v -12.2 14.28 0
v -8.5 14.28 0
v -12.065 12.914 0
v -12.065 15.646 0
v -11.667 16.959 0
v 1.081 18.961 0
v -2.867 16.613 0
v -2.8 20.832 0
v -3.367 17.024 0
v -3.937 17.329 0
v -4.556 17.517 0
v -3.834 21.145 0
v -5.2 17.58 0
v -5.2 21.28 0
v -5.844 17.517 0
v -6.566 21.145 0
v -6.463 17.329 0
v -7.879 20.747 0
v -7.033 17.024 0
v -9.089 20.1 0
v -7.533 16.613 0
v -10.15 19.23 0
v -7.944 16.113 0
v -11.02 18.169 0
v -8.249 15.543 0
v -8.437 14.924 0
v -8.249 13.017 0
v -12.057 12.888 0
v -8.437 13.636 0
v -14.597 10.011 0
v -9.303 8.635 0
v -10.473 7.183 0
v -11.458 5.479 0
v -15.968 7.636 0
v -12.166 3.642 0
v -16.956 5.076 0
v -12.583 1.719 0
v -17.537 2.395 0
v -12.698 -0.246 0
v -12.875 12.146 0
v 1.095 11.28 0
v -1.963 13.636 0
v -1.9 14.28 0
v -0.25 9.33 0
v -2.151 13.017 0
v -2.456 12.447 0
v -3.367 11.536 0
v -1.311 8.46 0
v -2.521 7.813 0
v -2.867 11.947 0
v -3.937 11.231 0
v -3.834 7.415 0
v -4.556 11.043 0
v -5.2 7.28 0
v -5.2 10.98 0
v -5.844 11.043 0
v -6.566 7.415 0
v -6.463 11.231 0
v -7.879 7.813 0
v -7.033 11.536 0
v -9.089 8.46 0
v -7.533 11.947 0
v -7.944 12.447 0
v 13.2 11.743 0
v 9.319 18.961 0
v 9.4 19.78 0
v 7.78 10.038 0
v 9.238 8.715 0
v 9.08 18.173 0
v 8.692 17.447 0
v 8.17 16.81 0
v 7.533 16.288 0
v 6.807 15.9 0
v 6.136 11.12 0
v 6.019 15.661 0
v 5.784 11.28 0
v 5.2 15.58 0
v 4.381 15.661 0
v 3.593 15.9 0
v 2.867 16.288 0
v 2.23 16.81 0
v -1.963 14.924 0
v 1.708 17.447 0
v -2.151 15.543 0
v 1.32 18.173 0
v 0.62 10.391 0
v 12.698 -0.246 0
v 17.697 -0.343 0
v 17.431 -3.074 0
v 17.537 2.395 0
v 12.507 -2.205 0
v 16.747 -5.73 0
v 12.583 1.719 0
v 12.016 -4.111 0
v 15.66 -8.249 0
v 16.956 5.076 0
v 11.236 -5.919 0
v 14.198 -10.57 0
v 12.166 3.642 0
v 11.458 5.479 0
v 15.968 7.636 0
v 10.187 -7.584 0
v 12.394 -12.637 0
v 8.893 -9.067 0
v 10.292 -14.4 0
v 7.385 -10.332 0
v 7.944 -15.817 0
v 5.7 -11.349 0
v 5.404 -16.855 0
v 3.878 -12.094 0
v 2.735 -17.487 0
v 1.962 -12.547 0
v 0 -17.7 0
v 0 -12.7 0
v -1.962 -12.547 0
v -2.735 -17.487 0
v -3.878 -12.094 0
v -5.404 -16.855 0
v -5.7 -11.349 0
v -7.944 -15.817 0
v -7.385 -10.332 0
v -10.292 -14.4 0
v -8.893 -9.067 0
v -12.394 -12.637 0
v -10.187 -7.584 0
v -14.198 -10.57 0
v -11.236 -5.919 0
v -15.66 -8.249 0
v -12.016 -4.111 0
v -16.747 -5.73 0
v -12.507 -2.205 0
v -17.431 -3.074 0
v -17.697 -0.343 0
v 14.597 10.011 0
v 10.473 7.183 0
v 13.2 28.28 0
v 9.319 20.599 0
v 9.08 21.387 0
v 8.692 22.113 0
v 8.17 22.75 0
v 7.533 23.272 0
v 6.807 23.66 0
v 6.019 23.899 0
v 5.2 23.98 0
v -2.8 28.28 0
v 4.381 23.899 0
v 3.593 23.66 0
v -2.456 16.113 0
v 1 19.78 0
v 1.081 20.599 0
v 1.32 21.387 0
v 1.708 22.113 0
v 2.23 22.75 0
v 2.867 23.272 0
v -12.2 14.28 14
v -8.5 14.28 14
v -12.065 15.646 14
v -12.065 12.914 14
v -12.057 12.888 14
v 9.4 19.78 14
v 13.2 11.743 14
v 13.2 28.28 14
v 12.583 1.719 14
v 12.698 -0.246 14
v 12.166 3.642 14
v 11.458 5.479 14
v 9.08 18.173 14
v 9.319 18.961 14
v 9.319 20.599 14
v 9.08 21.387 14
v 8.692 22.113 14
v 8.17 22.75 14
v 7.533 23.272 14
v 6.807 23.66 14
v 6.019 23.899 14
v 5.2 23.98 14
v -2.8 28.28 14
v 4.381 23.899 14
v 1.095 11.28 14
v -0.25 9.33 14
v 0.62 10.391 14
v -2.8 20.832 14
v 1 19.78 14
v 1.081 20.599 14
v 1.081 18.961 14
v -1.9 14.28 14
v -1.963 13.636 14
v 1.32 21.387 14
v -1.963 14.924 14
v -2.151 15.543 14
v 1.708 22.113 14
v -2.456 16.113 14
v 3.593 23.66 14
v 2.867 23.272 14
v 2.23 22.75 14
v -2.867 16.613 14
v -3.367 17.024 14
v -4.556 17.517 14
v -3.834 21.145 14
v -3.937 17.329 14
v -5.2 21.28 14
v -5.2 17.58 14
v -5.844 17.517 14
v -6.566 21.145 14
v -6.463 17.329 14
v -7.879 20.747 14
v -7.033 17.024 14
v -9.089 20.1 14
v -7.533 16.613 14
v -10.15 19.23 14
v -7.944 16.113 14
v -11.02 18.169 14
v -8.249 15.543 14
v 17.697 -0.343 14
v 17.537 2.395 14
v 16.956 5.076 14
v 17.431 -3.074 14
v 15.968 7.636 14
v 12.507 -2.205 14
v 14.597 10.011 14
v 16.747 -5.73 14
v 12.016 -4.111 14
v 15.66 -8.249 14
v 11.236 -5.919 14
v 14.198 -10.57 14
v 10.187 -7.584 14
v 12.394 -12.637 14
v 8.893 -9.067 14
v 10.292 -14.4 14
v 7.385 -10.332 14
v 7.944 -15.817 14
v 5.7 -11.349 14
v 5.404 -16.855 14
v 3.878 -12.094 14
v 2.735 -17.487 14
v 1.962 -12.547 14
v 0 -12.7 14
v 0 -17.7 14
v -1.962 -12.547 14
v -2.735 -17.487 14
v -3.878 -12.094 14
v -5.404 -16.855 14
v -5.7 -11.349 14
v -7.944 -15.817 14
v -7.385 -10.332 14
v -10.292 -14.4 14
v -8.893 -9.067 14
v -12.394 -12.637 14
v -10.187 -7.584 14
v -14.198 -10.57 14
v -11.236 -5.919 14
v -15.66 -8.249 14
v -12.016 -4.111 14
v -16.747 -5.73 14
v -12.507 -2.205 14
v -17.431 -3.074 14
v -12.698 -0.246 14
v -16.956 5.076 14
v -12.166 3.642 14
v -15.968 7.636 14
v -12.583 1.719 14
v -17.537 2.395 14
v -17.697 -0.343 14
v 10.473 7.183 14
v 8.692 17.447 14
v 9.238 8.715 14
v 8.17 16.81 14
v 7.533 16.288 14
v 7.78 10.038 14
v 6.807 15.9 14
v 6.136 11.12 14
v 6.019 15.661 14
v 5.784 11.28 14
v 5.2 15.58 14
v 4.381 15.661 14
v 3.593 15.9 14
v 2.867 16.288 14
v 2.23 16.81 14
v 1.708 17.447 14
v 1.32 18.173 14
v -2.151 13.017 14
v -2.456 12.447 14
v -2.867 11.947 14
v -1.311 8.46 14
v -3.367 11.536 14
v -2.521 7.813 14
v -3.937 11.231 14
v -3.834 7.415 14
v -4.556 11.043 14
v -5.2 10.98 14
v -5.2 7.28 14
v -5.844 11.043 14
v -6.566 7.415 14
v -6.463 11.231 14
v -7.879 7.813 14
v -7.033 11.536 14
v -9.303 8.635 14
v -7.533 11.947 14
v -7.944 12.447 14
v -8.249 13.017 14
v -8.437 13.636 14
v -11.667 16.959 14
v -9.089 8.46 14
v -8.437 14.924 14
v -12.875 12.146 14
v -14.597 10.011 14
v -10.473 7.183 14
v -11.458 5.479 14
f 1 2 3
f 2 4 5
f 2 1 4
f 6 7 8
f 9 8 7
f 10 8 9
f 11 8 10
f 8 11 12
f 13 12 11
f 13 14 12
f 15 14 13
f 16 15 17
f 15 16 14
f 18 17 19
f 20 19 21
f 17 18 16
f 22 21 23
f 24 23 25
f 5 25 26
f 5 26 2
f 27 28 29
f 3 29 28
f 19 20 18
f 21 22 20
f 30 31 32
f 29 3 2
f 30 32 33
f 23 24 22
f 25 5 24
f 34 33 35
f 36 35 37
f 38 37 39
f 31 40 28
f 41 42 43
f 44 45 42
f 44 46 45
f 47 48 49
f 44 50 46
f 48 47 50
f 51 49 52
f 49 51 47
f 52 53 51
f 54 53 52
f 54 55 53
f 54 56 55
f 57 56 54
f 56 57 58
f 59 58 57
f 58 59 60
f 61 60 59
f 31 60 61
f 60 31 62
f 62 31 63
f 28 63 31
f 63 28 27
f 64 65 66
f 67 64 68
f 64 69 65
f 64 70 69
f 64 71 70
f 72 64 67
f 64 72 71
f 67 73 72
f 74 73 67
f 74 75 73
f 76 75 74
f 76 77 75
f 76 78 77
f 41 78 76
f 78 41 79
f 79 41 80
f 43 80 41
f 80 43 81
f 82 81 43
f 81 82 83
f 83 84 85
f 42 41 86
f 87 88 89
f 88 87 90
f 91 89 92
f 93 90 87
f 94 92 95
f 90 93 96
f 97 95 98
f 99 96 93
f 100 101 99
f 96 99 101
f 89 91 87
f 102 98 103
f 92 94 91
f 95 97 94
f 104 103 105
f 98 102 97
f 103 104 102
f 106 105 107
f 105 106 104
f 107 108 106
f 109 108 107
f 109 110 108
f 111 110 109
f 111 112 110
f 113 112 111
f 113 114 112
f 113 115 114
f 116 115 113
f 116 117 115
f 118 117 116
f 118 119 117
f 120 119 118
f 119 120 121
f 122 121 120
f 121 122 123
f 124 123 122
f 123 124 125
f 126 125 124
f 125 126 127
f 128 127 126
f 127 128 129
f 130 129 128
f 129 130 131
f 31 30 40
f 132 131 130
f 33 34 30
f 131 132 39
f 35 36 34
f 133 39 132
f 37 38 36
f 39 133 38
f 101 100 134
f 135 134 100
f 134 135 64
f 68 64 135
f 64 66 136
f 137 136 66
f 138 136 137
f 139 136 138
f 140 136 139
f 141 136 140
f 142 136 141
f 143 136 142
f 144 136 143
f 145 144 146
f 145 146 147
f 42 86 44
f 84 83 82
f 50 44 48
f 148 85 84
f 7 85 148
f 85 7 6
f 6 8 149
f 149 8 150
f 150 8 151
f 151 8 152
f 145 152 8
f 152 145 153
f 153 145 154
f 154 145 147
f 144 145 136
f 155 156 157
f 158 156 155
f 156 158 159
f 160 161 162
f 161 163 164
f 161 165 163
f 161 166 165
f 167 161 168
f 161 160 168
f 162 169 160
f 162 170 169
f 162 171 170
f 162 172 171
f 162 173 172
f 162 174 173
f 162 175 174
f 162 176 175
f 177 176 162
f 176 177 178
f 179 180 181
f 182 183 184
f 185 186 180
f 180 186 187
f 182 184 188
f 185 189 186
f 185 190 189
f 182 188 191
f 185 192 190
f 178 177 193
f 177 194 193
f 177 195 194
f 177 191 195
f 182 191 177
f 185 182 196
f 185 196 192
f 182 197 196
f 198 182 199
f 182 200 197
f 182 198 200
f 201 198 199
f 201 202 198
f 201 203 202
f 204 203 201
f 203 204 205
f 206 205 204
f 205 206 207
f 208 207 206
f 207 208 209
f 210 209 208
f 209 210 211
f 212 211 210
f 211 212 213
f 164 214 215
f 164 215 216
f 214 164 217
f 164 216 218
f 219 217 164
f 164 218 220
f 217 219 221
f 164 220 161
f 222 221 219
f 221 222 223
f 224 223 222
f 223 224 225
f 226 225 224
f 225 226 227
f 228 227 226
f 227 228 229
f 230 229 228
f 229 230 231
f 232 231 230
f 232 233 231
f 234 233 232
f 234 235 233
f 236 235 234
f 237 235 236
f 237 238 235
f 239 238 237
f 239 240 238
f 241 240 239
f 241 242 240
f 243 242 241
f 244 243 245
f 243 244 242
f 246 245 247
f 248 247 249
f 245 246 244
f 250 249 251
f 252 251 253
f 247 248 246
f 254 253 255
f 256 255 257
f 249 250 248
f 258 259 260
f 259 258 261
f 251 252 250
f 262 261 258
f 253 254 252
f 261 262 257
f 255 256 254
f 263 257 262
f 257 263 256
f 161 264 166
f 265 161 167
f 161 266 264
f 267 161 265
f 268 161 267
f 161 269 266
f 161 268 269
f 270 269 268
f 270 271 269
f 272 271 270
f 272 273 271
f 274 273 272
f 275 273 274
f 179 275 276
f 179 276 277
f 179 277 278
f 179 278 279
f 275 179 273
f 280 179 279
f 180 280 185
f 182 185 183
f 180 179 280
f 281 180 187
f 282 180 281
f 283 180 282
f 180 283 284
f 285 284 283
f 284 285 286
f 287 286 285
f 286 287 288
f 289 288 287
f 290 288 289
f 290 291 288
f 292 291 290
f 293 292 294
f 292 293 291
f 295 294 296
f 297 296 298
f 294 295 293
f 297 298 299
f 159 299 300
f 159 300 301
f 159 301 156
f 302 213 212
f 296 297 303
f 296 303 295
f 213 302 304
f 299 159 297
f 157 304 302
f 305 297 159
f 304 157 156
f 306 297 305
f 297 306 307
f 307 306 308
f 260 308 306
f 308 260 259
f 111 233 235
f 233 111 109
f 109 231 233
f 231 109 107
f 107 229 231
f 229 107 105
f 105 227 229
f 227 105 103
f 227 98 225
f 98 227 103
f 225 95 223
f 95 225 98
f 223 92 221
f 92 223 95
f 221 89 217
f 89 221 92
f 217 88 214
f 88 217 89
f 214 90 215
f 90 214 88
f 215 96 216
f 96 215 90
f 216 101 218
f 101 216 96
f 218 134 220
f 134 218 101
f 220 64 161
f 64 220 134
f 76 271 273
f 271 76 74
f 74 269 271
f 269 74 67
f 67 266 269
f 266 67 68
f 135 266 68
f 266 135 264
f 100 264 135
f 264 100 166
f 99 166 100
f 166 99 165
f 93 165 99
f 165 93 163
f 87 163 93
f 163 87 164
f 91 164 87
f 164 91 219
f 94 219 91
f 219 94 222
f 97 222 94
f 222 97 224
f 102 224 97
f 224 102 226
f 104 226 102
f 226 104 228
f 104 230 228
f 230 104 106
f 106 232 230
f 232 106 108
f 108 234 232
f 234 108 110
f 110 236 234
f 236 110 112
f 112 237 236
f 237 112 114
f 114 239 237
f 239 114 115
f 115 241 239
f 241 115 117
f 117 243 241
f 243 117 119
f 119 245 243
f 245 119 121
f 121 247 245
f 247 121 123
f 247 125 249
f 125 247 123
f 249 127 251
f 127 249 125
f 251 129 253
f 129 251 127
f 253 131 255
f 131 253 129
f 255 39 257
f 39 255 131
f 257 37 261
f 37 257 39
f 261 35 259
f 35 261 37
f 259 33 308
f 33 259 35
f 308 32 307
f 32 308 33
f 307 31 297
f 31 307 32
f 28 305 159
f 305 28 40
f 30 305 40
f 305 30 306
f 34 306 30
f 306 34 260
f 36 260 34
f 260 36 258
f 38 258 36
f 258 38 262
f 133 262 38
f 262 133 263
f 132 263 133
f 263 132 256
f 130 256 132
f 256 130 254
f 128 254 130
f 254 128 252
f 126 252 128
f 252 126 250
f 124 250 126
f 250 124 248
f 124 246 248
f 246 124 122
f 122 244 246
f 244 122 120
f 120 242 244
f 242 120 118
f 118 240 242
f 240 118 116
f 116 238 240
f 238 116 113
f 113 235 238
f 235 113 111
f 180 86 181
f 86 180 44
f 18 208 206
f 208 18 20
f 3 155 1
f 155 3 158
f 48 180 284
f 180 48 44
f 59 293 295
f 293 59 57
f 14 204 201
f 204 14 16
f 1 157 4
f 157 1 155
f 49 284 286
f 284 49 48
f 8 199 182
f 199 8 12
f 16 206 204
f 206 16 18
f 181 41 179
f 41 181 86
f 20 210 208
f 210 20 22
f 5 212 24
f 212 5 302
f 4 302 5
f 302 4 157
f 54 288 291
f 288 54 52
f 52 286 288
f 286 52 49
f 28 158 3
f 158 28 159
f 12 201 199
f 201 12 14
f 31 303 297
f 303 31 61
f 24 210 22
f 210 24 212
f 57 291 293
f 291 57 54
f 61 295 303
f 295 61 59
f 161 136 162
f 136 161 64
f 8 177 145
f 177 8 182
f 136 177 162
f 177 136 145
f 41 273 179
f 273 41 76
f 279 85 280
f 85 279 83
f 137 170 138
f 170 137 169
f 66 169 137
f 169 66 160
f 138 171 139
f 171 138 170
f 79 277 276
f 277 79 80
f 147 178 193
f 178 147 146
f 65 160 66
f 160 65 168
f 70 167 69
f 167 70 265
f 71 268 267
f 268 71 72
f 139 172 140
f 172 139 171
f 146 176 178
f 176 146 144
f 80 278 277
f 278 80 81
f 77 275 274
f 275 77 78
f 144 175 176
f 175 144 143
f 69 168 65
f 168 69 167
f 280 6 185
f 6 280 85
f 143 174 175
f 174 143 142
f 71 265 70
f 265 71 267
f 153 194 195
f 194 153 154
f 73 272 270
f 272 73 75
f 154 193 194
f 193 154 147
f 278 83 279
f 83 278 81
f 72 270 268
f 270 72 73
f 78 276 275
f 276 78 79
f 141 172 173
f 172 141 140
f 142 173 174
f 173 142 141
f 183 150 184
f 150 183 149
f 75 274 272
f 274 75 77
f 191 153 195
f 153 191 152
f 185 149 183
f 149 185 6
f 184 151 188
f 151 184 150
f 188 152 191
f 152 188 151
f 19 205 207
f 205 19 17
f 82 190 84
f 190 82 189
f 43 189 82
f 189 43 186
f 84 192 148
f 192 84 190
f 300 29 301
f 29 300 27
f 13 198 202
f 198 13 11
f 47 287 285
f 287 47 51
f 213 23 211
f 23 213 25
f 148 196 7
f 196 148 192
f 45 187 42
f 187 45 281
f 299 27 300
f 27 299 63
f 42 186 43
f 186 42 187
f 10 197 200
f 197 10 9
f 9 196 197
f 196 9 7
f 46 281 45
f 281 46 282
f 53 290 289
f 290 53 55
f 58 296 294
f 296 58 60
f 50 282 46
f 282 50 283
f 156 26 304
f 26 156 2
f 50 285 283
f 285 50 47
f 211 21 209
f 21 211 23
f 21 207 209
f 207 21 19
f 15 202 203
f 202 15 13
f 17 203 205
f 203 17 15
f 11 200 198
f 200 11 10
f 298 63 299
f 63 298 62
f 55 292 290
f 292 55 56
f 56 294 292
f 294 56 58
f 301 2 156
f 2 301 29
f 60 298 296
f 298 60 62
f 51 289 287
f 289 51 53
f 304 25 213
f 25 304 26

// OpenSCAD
$fn = 32;

// ----------------------------------------------------------------------
// Pipe clamp: 35.4 mm ring, 5 mm wall, 14 mm wide
// ----------------------------------------------------------------------

// --- parameters (mm) ---
outer_r = 17.7;           // clamp outside radius
inner_r = 12.7;           // pipe bore radius
band = 5;                 // band thickness
clamp_w = 14;             // clamp width
opening = 40;             // opening angle between the ends
lug_w = 16;               // lug width
lug_len = 17;             // lug length
bolt_d = 8.4;             // bolt hole
knuckle_d = 14;           // hinge knuckle diameter
pin_d = 6.6;              // hinge pin hole

clamp_profile = [[-6.054, 16.633], [-8.551, 15.497], [-10.843, 13.99], [-12.875, 12.146], [-14.597, 10.011], [-15.968, 7.636], [-16.956, 5.076], [-17.537, 2.395], [-17.697, -0.343], [-17.431, -3.074], [-16.747, -5.73], [-15.66, -8.249], [-14.198, -10.57], [-12.394, -12.637], [-10.292, -14.4], [-7.944, -15.817], [-5.404, -16.855], [-2.735, -17.487], [0, -17.7], [2.735, -17.487], [5.404, -16.855], [7.944, -15.817], [10.292, -14.4], [12.394, -12.637], [14.198, -10.57], [15.66, -8.249], [16.747, -5.73], [17.431, -3.074], [17.697, -0.343], [17.537, 2.395], [16.956, 5.076], [15.968, 7.636], [14.597, 10.011], [12.875, 12.146], [10.843, 13.99], [8.551, 15.497], [6.054, 16.633], [4.344, 11.934], [6.136, 11.12], [7.78, 10.038], [9.238, 8.715], [10.473, 7.183], [11.458, 5.479], [12.166, 3.642], [12.583, 1.719], [12.698, -0.246], [12.507, -2.205], [12.016, -4.111], [11.236, -5.919], [10.187, -7.584], [8.893, -9.067], [7.385, -10.332], [5.7, -11.349], [3.878, -12.094], [1.962, -12.547], [0, -12.7], [-1.962, -12.547], [-3.878, -12.094], [-5.7, -11.349], [-7.385, -10.332], [-8.893, -9.067], [-10.187, -7.584], [-11.236, -5.919], [-12.016, -4.111], [-12.507, -2.205], [-12.698, -0.246], [-12.583, 1.719], [-12.166, 3.642], [-11.458, 5.479], [-10.473, 7.183], [-9.238, 8.715], [-7.78, 10.038], [-6.136, 11.12], [-4.344, 11.934]];

difference() {
  union() {
    linear_extrude(height = clamp_w) polygon(clamp_profile);
    /* hinge knuckle, sunk 2 mm into the band end */
    translate([-5.2, 14.28, 0]) cylinder(h = clamp_w, d = knuckle_d);
    /* bolt lug on the other end */
    translate([-2.8, 11.28, 0]) cube([lug_w, 17, clamp_w]);
  }
  translate([5.2, 19.78, -2.5]) cylinder(h = clamp_w + 5, d = bolt_d);
  translate([-5.2, 14.28, -2.5]) cylinder(h = clamp_w + 5, d = pin_d);
}
